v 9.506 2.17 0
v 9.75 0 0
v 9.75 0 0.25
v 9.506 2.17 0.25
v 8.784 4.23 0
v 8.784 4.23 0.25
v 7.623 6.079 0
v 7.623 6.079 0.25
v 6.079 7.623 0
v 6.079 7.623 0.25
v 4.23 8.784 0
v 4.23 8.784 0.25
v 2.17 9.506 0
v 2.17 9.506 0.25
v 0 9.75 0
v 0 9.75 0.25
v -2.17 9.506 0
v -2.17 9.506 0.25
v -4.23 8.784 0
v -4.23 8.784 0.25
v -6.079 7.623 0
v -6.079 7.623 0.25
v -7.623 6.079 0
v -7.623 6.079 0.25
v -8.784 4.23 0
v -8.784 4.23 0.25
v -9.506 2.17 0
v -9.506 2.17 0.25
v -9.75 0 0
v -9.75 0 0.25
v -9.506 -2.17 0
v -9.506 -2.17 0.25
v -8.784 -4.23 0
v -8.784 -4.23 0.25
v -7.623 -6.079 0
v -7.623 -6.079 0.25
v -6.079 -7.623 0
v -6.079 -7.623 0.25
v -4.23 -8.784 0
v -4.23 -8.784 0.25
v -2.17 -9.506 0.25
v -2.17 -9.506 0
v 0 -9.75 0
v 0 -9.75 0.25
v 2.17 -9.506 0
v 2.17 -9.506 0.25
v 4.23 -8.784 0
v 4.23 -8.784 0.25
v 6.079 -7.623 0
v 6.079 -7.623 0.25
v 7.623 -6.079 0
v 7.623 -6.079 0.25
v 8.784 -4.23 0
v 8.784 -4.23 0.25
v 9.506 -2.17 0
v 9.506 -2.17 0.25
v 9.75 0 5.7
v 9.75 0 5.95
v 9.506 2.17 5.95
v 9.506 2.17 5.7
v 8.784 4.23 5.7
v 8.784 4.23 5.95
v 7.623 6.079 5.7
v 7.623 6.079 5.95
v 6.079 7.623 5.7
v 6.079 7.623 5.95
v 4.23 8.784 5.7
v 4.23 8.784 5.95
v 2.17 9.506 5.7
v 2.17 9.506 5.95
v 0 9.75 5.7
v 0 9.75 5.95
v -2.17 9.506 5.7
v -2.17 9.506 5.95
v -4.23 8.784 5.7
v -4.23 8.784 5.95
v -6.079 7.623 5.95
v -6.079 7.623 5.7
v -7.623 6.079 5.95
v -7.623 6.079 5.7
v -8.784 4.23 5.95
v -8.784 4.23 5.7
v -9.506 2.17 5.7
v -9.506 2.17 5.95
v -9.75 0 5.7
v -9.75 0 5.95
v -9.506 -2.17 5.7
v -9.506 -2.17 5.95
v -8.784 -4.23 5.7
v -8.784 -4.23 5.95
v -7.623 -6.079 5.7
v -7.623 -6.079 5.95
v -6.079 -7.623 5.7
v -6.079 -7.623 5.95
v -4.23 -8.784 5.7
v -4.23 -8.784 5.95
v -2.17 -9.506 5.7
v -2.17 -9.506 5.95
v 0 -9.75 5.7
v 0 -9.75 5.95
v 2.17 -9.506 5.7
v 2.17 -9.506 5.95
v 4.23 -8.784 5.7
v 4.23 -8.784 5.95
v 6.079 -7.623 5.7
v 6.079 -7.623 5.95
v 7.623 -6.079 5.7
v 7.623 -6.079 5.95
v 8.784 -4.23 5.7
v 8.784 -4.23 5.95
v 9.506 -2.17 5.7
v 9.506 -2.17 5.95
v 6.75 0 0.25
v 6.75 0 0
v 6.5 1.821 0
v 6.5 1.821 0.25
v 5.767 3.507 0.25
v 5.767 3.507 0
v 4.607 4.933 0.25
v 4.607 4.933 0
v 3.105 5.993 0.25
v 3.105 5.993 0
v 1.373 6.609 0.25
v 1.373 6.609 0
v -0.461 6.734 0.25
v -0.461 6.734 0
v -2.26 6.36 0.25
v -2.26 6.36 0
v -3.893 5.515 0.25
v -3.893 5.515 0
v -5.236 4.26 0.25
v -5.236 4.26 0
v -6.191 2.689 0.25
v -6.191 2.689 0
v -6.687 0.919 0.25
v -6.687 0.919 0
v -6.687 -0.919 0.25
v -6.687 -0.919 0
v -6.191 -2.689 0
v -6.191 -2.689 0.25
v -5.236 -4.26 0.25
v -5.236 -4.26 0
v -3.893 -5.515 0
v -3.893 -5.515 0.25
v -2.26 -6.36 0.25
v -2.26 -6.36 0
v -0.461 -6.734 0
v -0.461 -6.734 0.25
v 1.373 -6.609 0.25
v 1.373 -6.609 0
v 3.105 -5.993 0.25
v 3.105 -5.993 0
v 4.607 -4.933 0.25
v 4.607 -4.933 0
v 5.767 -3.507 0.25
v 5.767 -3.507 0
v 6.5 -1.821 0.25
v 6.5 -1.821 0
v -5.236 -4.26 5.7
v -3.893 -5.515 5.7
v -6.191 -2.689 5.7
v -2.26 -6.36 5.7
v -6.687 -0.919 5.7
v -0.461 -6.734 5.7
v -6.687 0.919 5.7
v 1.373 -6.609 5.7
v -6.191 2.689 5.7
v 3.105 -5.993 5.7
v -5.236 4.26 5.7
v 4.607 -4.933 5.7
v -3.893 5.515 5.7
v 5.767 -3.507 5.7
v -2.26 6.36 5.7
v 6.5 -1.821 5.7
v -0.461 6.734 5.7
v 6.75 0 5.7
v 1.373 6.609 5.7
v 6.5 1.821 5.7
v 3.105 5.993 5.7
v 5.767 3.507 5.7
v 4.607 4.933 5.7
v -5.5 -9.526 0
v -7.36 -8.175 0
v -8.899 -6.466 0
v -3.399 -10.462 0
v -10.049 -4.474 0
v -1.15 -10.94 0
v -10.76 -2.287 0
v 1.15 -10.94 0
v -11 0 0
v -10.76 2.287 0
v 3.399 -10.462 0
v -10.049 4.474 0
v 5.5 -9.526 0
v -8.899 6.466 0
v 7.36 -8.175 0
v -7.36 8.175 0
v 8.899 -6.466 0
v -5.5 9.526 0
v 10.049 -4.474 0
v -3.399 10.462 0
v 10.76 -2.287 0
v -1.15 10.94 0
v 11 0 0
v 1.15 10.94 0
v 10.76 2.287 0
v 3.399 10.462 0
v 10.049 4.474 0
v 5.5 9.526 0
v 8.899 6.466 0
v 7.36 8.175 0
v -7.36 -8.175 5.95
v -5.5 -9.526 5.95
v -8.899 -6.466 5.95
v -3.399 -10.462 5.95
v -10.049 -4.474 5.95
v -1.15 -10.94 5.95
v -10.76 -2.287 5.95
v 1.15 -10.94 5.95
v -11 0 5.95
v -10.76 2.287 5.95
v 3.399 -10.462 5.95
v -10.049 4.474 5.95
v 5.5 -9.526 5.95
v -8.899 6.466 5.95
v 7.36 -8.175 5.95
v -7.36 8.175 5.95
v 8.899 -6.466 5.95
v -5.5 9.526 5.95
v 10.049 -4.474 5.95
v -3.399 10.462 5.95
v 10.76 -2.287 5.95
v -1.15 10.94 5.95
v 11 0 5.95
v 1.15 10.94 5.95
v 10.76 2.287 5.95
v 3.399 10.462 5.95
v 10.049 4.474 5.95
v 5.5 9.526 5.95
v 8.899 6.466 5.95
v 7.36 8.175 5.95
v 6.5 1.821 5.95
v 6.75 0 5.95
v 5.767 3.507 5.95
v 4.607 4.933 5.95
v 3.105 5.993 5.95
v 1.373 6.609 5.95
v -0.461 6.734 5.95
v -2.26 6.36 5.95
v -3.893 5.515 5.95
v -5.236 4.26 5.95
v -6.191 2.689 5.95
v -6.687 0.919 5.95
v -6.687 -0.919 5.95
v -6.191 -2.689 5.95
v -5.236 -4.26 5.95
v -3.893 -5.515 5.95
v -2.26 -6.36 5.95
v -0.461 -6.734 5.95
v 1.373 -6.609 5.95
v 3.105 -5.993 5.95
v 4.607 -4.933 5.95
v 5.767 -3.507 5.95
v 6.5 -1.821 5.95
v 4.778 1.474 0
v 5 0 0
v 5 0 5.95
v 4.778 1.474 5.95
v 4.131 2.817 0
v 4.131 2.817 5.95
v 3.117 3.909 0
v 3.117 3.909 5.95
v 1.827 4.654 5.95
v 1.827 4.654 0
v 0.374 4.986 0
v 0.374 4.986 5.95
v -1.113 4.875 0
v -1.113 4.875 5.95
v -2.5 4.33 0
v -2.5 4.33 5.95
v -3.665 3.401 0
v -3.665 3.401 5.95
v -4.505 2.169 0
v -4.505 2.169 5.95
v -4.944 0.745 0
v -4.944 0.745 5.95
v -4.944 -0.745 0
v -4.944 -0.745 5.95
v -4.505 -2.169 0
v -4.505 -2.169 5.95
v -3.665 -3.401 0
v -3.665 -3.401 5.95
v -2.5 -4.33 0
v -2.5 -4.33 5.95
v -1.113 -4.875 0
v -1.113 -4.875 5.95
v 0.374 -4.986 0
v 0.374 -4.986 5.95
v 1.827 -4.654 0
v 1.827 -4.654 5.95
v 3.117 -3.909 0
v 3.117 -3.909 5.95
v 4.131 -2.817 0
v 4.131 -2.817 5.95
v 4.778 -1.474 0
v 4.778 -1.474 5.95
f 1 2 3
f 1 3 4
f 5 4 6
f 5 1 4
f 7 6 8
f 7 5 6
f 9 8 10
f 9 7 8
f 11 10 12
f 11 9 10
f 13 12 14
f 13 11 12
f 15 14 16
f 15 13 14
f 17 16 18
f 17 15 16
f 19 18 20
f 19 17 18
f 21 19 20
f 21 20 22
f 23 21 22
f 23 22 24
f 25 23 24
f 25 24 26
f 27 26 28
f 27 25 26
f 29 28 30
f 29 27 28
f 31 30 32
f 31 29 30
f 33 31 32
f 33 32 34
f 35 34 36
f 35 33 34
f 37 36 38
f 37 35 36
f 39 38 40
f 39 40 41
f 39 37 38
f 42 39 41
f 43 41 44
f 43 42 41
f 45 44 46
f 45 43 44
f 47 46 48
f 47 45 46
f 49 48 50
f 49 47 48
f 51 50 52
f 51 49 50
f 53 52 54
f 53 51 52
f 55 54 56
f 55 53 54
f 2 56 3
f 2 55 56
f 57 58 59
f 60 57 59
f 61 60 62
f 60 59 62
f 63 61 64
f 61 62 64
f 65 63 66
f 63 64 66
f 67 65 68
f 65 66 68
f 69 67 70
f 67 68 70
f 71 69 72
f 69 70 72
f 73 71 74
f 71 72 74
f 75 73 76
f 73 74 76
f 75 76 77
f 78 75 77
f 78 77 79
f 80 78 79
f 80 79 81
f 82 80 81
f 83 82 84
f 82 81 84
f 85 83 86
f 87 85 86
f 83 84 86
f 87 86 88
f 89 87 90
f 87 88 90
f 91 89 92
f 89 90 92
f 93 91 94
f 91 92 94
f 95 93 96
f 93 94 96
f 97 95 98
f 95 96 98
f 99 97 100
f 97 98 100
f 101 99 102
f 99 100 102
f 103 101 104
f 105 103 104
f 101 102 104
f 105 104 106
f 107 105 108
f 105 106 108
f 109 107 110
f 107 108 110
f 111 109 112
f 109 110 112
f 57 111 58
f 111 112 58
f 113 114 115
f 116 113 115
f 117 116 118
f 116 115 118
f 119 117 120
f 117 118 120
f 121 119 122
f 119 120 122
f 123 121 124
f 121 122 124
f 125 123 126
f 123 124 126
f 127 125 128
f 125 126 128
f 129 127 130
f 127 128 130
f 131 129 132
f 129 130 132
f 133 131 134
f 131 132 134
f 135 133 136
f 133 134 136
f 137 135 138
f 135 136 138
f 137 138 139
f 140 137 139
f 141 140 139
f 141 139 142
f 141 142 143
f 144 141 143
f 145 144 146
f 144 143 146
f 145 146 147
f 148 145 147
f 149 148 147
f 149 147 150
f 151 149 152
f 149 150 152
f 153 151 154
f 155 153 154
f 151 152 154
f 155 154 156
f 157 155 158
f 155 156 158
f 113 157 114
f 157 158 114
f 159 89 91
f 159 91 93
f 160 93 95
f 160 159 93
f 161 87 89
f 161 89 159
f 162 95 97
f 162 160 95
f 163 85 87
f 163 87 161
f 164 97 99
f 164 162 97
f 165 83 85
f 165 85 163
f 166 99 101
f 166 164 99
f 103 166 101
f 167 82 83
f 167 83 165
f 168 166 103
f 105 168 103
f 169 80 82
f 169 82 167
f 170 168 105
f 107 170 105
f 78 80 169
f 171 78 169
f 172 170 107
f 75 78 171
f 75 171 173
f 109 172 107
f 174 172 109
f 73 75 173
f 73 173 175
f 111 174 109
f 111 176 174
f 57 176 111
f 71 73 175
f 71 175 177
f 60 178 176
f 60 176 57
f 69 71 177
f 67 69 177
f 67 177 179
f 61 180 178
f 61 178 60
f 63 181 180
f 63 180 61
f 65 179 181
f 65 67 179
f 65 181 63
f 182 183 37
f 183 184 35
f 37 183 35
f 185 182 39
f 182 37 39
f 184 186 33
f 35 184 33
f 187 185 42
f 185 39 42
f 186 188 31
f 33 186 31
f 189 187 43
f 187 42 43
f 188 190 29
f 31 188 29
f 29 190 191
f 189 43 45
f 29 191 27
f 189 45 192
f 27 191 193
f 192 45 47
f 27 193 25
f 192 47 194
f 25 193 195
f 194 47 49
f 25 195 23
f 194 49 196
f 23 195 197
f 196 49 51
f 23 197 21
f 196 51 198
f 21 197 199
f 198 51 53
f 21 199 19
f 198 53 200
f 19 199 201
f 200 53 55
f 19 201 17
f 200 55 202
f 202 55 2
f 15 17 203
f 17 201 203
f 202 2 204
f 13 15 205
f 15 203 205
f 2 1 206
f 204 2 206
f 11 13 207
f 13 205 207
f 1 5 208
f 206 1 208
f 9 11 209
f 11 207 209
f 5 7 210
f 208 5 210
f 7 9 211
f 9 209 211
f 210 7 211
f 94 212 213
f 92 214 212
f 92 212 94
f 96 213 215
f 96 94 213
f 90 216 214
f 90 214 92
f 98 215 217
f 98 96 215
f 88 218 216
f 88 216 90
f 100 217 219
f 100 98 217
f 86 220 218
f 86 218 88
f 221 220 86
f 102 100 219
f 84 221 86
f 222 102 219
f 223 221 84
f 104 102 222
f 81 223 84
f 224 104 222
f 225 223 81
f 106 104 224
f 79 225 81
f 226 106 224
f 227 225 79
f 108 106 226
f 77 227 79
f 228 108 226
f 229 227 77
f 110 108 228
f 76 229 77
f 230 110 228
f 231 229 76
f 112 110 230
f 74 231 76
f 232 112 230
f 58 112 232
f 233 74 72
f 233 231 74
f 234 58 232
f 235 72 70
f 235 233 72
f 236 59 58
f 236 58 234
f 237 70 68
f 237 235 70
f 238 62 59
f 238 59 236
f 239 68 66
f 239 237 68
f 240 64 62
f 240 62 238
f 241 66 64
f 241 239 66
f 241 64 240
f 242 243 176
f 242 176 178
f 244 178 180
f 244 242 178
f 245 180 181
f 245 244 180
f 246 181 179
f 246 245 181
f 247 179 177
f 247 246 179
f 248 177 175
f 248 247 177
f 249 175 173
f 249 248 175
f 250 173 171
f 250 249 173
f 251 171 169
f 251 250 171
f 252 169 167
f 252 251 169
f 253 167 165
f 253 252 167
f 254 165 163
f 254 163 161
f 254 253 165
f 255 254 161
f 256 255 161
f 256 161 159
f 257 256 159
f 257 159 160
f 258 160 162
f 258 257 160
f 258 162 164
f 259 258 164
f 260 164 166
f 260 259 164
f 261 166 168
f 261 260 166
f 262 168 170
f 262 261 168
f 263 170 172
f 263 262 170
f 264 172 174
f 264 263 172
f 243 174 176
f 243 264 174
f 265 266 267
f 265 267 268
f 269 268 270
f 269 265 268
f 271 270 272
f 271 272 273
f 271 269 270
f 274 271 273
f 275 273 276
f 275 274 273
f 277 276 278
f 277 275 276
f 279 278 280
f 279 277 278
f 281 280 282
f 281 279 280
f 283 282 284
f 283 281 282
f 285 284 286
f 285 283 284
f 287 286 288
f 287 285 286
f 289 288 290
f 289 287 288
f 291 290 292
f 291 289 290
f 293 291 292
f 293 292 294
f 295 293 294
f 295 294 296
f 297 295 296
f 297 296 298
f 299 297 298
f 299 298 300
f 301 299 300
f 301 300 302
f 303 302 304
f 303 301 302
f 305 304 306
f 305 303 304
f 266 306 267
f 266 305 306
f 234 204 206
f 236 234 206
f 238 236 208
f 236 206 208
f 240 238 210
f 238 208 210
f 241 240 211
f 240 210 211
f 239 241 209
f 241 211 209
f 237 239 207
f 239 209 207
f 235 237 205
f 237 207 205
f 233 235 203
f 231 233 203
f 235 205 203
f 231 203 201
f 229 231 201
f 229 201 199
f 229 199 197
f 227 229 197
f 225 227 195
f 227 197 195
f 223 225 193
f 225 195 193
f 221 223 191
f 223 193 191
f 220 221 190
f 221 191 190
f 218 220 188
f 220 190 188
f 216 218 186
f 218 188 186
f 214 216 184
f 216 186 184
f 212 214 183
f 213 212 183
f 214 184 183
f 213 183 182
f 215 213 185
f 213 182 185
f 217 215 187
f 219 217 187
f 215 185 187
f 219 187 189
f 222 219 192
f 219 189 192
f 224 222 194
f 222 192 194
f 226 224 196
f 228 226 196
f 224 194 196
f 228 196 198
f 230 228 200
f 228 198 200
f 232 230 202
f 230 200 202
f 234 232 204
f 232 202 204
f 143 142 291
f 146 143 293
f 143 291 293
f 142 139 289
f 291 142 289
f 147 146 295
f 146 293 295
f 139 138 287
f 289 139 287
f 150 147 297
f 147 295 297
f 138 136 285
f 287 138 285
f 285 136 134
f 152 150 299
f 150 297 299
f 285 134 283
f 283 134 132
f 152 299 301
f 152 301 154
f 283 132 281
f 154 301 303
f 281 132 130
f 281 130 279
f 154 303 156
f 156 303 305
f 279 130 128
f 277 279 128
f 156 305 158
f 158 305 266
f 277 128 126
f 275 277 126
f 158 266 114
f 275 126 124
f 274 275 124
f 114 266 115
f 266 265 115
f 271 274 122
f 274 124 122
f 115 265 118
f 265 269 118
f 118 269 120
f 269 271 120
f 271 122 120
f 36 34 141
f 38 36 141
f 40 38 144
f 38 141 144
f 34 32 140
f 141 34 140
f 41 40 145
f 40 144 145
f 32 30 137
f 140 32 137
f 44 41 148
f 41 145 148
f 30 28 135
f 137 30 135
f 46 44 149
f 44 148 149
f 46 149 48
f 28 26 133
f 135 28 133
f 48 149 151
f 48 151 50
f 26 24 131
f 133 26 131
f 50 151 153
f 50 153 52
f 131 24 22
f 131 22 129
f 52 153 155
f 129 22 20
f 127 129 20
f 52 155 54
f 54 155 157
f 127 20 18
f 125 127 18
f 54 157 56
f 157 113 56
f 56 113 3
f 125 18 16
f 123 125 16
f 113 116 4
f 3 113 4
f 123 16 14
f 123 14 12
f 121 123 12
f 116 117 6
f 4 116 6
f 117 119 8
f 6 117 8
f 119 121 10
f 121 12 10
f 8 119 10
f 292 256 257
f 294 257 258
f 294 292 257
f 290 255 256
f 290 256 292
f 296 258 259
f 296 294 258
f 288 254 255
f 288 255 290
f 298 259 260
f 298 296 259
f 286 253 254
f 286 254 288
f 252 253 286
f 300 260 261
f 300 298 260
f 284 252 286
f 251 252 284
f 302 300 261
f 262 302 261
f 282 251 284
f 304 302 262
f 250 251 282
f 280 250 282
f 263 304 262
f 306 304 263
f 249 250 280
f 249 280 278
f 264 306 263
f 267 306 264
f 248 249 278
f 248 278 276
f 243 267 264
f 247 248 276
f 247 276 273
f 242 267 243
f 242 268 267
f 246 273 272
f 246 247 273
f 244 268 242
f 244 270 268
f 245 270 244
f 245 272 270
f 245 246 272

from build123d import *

# Parameters (mm, degrees)
SKETCH3_R           = 11
SKETCH3_R_2         = 5
BOSS_EXTRUDE1_DEPTH = 5.95
SKETCH4_R           = 9.75
SKETCH4_R_2         = 6.75
CUT_EXTRUDE1_DEPTH  = 0.25


with BuildPart() as part:
    # Sketch3 → Boss-Extrude1 (new body)
    with BuildSketch(Plane.XY):
        Circle(SKETCH3_R)
        Circle(SKETCH3_R_2, mode=Mode.SUBTRACT)
    extrude(amount=BOSS_EXTRUDE1_DEPTH)

    # Sketch4 → Cut-Extrude1 (cut)
    with BuildSketch(Plane.XY.offset(5.95)):
        Circle(SKETCH4_R)
        Circle(SKETCH4_R_2, mode=Mode.SUBTRACT)
    cut_extrude1 = extrude(amount=-CUT_EXTRUDE1_DEPTH, mode=Mode.SUBTRACT)

    # Mirror1: Cut-Extrude1 across plane
    add(cut_extrude1.mirror(Plane.XY.offset(2.975)), mode=Mode.SUBTRACT)


solid = part.part
